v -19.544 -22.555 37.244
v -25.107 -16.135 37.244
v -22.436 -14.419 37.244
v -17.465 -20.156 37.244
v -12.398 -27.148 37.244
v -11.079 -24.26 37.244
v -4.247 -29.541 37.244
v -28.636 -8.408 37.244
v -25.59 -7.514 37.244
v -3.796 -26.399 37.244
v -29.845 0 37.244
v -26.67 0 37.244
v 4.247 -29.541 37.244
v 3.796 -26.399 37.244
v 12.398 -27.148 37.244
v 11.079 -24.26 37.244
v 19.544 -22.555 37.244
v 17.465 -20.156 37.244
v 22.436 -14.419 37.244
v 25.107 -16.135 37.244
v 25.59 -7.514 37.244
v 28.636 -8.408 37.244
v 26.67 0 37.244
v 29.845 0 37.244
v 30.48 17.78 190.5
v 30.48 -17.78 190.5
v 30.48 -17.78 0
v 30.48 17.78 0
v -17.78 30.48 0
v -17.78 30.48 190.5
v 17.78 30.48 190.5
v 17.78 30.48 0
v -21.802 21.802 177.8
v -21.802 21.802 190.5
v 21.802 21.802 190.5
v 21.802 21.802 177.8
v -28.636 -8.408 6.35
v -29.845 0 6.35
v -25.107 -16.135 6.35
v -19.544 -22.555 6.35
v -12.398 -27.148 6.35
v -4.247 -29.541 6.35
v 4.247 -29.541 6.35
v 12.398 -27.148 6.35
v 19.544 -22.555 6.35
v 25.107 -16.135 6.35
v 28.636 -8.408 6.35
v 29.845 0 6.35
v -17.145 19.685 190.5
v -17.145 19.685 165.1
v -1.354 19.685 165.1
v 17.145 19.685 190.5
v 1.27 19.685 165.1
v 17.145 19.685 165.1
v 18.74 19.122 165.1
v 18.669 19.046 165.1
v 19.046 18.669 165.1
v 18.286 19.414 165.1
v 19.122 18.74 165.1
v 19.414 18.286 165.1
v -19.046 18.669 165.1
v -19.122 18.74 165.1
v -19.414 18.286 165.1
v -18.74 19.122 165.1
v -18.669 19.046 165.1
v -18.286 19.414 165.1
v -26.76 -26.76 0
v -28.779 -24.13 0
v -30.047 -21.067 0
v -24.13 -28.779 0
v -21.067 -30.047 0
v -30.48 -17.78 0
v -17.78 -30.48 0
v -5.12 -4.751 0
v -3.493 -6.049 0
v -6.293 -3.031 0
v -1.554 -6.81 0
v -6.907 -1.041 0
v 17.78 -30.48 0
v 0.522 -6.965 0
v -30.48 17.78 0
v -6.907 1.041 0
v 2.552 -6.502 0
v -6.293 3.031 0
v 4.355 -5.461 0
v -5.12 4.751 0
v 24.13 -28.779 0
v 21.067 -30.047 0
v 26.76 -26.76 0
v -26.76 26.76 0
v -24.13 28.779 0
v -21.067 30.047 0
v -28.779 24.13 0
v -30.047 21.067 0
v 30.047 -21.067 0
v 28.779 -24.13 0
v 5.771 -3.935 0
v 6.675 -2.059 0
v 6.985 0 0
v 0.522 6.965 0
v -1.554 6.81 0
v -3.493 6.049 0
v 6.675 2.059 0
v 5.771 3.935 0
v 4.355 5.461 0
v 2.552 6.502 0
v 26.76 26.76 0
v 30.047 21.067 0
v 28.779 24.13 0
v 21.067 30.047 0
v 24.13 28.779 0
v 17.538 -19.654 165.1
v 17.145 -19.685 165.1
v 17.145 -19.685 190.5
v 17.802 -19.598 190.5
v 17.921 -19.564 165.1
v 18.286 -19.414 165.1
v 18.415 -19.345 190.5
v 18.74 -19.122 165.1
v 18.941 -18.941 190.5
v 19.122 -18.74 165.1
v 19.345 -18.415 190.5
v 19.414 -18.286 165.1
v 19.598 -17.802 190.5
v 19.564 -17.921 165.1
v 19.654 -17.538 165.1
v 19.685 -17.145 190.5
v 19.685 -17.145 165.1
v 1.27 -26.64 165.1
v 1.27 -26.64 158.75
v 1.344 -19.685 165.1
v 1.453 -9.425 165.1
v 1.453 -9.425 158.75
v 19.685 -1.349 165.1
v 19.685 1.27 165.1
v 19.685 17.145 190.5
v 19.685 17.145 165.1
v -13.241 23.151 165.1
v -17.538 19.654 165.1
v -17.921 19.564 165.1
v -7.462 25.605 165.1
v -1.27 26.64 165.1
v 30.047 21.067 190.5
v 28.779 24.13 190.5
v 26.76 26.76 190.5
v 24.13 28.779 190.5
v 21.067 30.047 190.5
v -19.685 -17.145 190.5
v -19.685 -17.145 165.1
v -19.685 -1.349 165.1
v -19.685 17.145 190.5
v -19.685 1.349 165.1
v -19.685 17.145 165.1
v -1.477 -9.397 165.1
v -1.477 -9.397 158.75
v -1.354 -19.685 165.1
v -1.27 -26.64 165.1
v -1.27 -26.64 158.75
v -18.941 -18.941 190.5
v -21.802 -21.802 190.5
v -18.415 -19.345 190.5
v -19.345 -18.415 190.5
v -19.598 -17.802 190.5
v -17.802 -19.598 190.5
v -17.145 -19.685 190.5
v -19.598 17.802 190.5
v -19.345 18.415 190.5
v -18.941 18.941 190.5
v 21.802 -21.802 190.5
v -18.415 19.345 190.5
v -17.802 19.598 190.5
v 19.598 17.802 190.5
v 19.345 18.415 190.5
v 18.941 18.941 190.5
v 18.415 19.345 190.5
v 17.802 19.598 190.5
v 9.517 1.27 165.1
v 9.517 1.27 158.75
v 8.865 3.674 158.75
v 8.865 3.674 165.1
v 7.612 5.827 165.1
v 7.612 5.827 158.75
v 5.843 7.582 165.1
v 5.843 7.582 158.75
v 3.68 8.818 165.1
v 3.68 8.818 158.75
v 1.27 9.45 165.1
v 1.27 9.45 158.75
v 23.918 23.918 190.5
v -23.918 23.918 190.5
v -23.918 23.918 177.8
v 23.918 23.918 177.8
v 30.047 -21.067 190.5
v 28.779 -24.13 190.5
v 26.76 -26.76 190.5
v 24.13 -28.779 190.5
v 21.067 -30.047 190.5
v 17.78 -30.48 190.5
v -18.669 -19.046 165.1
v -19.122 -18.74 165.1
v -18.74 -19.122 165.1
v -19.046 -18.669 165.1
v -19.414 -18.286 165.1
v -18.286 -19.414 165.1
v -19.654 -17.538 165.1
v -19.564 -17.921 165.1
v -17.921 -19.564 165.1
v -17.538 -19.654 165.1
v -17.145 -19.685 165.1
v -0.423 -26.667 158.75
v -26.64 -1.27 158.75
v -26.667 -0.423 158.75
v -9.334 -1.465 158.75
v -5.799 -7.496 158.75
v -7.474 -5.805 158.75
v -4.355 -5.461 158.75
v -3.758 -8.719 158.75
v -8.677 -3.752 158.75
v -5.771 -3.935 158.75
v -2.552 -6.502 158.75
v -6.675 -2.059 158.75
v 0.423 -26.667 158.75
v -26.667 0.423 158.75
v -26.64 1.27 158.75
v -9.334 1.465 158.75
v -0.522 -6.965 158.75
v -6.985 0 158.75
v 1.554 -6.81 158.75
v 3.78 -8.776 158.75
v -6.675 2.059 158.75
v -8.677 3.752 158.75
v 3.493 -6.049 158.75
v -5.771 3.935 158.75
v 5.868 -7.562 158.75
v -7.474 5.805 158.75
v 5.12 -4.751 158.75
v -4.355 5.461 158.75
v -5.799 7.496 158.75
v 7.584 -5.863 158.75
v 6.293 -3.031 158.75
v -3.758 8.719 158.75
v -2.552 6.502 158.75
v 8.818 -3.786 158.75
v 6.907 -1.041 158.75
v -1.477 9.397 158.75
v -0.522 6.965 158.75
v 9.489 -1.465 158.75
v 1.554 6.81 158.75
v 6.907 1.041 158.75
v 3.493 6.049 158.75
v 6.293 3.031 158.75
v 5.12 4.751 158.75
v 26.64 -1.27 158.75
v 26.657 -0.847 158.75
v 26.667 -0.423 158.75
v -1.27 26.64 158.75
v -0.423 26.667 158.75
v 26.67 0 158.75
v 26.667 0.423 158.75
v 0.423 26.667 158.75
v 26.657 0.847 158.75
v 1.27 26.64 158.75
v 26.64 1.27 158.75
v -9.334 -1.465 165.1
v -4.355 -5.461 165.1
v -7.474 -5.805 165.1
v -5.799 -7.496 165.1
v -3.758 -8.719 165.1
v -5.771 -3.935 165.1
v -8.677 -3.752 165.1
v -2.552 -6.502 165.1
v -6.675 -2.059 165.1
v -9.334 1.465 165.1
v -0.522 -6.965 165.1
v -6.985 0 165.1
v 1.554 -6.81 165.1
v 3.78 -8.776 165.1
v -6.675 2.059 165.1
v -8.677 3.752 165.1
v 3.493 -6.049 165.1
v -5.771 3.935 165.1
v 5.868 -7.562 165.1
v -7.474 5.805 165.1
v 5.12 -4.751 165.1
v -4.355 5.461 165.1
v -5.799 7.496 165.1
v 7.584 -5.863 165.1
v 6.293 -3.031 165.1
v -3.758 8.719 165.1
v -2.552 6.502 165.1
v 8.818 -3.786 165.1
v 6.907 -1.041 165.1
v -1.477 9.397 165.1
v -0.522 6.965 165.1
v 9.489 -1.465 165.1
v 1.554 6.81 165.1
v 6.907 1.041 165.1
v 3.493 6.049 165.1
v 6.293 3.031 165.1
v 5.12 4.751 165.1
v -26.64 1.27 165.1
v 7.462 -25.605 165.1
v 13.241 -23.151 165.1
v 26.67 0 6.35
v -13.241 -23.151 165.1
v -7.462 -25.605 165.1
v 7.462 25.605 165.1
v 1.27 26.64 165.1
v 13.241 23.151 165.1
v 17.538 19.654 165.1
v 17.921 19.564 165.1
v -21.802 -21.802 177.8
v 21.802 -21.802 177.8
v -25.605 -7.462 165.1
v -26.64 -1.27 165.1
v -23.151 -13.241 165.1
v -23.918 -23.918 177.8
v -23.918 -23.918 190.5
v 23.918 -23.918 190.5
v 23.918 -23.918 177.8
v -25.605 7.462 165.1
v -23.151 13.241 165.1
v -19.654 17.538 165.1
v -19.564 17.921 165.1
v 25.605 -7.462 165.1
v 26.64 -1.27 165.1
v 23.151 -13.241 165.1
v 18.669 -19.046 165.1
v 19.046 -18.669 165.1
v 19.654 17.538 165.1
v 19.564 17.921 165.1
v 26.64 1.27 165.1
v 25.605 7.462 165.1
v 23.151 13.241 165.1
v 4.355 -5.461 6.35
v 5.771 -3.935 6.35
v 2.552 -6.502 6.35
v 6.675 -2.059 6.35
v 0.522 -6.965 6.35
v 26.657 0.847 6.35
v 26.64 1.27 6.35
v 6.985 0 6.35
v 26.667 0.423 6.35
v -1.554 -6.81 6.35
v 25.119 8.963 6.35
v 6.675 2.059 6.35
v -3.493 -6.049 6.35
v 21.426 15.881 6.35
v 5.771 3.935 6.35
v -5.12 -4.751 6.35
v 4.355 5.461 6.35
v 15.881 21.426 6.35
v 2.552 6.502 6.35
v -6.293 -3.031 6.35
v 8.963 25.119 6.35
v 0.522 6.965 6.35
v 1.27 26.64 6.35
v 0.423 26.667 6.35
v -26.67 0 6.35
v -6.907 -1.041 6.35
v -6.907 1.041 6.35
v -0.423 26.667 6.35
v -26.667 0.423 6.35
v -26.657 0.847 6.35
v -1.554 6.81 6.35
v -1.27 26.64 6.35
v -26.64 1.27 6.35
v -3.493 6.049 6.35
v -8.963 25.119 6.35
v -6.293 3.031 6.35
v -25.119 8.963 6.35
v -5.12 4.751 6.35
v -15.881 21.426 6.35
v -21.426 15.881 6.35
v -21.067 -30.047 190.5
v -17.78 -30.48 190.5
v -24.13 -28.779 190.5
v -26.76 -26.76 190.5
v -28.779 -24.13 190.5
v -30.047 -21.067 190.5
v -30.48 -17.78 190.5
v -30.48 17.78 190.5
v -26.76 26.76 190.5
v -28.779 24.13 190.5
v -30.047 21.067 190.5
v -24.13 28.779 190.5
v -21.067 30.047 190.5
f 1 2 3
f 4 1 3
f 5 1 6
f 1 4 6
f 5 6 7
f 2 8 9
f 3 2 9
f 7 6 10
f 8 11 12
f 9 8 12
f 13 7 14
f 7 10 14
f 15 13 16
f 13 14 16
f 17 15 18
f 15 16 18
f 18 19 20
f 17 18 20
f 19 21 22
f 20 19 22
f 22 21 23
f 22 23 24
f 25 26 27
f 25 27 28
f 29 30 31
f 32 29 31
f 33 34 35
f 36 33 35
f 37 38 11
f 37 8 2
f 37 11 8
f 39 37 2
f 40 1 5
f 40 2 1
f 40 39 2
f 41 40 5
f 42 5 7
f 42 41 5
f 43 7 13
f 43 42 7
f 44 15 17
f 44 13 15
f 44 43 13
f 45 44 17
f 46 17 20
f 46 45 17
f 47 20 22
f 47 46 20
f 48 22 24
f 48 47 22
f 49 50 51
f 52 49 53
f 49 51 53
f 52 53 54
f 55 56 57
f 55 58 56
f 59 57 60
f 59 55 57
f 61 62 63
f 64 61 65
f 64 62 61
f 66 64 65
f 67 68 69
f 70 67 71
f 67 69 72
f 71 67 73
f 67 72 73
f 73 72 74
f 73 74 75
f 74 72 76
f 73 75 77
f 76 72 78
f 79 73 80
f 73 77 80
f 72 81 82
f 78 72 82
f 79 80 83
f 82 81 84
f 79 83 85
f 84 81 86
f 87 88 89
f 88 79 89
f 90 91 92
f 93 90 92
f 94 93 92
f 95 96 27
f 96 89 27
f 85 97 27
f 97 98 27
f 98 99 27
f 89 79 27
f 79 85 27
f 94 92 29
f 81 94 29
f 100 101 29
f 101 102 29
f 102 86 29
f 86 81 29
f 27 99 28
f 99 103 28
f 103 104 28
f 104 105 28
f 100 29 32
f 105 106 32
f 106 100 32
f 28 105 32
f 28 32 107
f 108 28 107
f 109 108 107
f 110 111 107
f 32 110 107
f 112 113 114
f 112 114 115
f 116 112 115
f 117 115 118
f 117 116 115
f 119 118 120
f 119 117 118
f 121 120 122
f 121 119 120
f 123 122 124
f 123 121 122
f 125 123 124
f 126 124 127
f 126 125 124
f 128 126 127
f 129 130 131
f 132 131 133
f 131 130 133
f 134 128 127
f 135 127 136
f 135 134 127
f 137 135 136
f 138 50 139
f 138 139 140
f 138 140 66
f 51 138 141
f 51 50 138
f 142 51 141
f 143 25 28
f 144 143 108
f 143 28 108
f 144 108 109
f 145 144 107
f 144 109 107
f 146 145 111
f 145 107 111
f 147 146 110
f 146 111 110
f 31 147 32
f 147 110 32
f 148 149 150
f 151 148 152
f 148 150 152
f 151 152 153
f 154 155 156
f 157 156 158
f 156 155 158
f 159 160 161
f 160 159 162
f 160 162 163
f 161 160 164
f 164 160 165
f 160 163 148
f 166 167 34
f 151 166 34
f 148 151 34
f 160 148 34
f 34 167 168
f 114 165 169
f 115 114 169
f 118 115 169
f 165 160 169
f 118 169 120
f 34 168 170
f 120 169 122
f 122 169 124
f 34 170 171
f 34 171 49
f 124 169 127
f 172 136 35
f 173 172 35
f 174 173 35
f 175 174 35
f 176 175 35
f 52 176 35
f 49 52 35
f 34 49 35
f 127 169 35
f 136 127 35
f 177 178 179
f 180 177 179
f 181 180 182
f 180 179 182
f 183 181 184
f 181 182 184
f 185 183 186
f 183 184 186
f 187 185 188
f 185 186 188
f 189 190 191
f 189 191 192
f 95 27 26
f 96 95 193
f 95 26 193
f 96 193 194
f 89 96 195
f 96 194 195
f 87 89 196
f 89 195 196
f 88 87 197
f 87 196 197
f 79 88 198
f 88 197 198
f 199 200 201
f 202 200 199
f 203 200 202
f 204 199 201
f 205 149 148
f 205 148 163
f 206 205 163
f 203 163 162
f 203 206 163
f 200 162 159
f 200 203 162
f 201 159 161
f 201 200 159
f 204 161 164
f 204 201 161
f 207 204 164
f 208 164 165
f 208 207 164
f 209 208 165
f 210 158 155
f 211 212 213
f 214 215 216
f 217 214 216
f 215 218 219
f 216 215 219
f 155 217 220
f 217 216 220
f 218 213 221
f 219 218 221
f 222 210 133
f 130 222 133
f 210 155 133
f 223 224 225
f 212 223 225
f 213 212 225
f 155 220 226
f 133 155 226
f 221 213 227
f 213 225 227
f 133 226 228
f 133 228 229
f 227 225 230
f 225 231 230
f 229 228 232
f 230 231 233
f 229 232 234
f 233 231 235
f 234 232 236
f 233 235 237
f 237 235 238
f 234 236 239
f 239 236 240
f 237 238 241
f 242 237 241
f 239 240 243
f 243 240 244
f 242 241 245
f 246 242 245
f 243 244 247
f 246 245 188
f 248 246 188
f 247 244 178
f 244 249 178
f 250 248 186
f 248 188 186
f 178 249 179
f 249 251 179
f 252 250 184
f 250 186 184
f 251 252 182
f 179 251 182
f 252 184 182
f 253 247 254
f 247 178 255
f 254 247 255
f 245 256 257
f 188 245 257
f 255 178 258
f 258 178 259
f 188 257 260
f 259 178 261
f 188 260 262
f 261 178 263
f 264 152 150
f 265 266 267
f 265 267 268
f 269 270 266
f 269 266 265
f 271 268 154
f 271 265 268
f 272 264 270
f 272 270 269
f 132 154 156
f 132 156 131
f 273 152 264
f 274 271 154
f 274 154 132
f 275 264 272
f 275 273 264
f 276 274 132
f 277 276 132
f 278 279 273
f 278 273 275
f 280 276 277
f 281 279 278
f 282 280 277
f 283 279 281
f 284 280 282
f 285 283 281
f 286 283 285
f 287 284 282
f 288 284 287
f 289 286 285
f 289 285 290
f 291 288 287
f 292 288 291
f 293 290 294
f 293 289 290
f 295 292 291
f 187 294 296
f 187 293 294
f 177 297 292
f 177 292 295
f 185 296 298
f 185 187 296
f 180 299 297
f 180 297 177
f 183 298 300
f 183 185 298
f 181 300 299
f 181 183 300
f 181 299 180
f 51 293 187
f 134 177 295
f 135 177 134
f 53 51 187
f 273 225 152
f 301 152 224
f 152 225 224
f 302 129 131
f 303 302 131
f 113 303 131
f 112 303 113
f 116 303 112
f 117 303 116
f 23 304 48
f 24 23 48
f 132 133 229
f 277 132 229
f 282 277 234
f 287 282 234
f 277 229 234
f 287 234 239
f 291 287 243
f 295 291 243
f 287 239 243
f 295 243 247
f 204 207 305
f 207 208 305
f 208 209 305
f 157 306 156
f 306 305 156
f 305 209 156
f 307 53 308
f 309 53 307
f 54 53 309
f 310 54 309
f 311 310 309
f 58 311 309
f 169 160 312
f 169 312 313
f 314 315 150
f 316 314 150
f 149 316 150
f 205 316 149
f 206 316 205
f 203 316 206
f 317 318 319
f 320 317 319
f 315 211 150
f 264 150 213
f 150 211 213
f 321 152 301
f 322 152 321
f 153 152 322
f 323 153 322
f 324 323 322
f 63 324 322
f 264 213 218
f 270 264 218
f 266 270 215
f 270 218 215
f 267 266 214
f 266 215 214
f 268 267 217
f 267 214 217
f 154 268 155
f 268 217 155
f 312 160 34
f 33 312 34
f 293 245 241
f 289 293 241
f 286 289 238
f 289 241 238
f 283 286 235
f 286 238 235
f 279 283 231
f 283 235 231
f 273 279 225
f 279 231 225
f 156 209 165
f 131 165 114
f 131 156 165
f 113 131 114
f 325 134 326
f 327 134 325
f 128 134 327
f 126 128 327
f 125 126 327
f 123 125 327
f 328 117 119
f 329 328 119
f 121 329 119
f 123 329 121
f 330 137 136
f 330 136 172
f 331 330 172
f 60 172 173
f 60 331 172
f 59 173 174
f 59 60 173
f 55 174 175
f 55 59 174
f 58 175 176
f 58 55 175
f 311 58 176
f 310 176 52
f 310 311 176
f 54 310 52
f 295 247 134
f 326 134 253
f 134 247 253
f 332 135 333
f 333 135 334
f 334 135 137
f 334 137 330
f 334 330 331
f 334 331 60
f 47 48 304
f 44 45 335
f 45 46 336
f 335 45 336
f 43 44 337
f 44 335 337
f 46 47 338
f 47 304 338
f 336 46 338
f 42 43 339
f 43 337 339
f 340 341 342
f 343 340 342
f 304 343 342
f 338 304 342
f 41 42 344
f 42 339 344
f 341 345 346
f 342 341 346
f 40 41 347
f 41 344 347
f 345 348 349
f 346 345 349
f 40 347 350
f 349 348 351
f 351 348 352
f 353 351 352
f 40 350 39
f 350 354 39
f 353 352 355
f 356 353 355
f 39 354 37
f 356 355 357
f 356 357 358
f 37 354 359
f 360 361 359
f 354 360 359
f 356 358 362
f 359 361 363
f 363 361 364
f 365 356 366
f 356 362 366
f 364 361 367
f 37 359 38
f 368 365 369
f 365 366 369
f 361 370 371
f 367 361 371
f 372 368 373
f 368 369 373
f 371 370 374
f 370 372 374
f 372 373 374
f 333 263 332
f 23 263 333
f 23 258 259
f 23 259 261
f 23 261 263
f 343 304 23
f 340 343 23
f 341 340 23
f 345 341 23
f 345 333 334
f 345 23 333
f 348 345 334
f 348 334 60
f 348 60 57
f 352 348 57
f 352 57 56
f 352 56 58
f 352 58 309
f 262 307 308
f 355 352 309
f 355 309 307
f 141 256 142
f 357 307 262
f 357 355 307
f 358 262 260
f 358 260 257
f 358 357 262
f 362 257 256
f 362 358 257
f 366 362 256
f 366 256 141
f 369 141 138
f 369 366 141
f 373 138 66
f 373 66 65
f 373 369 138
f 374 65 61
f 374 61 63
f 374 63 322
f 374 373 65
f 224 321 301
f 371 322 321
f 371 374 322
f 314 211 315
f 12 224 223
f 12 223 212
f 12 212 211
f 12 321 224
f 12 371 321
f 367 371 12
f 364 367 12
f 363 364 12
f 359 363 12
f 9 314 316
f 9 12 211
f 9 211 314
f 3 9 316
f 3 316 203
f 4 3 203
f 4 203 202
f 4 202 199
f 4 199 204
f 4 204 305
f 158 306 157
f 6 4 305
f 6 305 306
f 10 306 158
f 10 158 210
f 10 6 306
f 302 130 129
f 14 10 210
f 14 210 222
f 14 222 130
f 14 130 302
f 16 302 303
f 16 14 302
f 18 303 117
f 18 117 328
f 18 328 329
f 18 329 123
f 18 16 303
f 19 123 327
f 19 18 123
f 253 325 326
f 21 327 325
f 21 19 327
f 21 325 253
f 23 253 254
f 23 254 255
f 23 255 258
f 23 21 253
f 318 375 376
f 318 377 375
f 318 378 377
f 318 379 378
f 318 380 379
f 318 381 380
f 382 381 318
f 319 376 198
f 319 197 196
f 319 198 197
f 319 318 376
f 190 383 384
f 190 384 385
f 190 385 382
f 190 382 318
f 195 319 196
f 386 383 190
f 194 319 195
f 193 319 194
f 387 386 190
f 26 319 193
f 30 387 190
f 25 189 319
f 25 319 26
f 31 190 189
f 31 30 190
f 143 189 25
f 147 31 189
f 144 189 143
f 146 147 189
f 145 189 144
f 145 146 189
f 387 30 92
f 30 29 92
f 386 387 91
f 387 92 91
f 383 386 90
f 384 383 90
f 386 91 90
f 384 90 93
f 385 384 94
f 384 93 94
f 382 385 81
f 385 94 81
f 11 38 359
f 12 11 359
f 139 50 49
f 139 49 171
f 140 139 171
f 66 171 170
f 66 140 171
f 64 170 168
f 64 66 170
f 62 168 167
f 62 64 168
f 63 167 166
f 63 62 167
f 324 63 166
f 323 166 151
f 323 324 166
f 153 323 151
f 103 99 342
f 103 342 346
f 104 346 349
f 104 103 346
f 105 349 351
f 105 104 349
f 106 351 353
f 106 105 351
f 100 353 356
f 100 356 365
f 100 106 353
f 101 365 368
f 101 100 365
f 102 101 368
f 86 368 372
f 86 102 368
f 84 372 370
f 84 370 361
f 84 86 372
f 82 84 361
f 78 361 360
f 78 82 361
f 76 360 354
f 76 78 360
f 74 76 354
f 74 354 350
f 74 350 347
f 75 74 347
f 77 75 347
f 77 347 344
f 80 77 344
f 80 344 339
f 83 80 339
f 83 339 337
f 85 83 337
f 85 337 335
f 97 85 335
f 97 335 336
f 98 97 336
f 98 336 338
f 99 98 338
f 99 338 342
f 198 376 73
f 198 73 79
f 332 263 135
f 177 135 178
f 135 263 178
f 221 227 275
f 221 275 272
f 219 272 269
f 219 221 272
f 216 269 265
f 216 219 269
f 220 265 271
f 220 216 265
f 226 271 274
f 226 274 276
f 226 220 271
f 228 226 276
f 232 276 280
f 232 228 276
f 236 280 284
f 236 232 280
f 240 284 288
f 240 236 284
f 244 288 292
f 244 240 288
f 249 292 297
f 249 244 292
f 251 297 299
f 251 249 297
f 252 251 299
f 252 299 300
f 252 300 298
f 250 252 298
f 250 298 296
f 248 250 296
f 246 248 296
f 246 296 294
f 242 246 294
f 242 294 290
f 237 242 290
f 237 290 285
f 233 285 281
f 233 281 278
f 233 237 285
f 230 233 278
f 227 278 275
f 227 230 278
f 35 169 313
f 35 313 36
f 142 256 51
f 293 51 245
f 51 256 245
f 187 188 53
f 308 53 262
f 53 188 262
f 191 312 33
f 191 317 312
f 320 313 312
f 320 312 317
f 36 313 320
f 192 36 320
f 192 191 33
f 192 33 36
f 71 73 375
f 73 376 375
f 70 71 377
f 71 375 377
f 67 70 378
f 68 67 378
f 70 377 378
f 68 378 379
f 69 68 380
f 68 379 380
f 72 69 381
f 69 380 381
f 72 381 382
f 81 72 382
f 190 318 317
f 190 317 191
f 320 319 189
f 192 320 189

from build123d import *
from build123d.topology import SkipClean

# Parameters (mm, degrees)
SKETCH1_R           = 29.845
SKETCH1_R_2         = 26.67
BOSS_EXTRUDE1_DEPTH = 165.1
SKETCH2_W           = 59.69
SKETCH2_H           = 38.1
CUT_EXTRUDE1_DEPTH  = 171.409677102
BOSS_EXTRUDE2_DEPTH = 6.35
SKETCH5_R           = 29.845
SKETCH5_R_2         = 6.985
BOSS_EXTRUDE4_DEPTH = 6.35
BOSS_EXTRUDE5_START = -6.35
SKETCH4_R           = 29.845
SKETCH4_R_2         = 26.67
SKETCH4_R_3         = 6.985
BOSS_EXTRUDE5_DEPTH = 6.35
SKETCH6_W           = 60.96
SKETCH6_H           = 60.96
SKETCH6_R           = 29.845
BOSS_EXTRUDE7_DEPTH = 190.5
BOSS_EXTRUDE8_START = -25.4
SKETCH7_W           = 60.96
SKETCH7_H           = 60.96
SKETCH7_R           = 29.845
SKETCH7_W_2         = 39.37
SKETCH7_H_2         = 39.37
BOSS_EXTRUDE8_DEPTH = 25.4
SKETCH8_W           = 47.836836
SKETCH8_H           = 47.836836
SKETCH8_W_2         = 43.603672
SKETCH8_H_2         = 43.603672
CUT_EXTRUDE2_DEPTH  = 12.7
FILLET1_R           = 2.54
FILLET2_R           = 12.7


with BuildPart() as part:
    # Sketch1 → Boss-Extrude1 (new body)
    with BuildSketch(Plane.XY):
        Circle(SKETCH1_R)
        Circle(SKETCH1_R_2, mode=Mode.SUBTRACT)
    extrude(amount=BOSS_EXTRUDE1_DEPTH)

    # Sketch2 → Cut-Extrude1 (cut, through all)
    with BuildSketch(Plane(origin=(0, 0, 0), x_dir=(1, 0, 0), z_dir=(0, 1, 0))):
        with Locations((0, -18.194460122)):
            Rectangle(SKETCH2_W, SKETCH2_H)
    extrude(amount=-CUT_EXTRUDE1_DEPTH, mode=Mode.SUBTRACT)

    # Sketch3 → Boss-Extrude2 (add)
    with BuildSketch(Plane(origin=(0, 0, 0), x_dir=(-1, 0, 0), z_dir=(0, 0, -1))):
        with BuildLine():
            Line((-29.845, 0), (-6.985, 0))
            ThreePointArc((-6.985, 0), (0, 6.985), (6.985, 0))
            Line((6.985, 0), (29.845, 0))
            ThreePointArc((29.845, 0), (0, 29.845), (-29.845, 0))
        make_face()
    extrude(amount=-BOSS_EXTRUDE2_DEPTH)

    # Sketch5 → Boss-Extrude4 (add)
    with SkipClean():  # the faces are left unmerged after this step: merging them gives an invalid solid
        with BuildSketch(Plane(origin=(0, 0, 0), x_dir=(-1, 0, 0), z_dir=(0, 0, -1))):
            with Locations(Location((0, 0, 0), (0, 0, 180))):
                Circle(SKETCH5_R)
            with BuildLine():
                Line((26.639744744, 1.27), (9.33422749, 1.465384615))
                ThreePointArc((9.33422749, 1.465384615), (6.689709997, 6.703146826), (1.477288556, 9.397267918))
                Line((1.477288556, 9.397267918), (1.27, 26.639744744))
                ThreePointArc((1.27, 26.639744744), (18.858537854, 18.858537854), (26.639744744, 1.27))
            make_face(mode=Mode.SUBTRACT)
            with BuildLine():
                Line((-1.27, 26.639744744), (-1.27, 9.45004085))
                ThreePointArc((-1.27, 9.45004085), (-6.784923303, 6.762723487), (-9.517329266, 1.27))
                Line((-9.517329266, 1.27), (-26.639744744, 1.27))
                ThreePointArc((-26.639744744, 1.27), (-18.858537854, 18.858537854), (-1.27, 26.639744744))
            make_face(mode=Mode.SUBTRACT)
            Circle(SKETCH5_R_2, mode=Mode.SUBTRACT)
        extrude(amount=-BOSS_EXTRUDE4_DEPTH)

    # Sketch4 → Boss-Extrude5 (add)
    # profile 1 of 2: a face of its own
    with SkipClean():  # the faces are left unmerged after this step: merging them gives an invalid solid
        with BuildSketch(Plane.XY.offset(165.1).offset(BOSS_EXTRUDE5_START)):
            Circle(SKETCH4_R)
            with Locations(Location((0, 0, 0), (0, 0, 180))):
                Circle(SKETCH4_R_2, mode=Mode.SUBTRACT)
        # profile 2 of 2: a face of its own
        with BuildSketch(Plane.XY.offset(165.1).offset(BOSS_EXTRUDE5_START)):
            with BuildLine():
                Line((1.27, 9.45004085), (1.27, 26.639744744))
                ThreePointArc((1.27, 26.639744744), (0, 26.67), (-1.27, 26.639744744))
                Line((-1.27, 26.639744744), (-1.477288556, 9.397267918))
                ThreePointArc((-1.477288556, 9.397267918), (-6.689709997, 6.703146826), (-9.33422749, 1.465384615))
                Line((-9.33422749, 1.465384615), (-26.639744744, 1.27))
                ThreePointArc((-26.639744744, 1.27), (-26.67, 0), (-26.639744744, -1.27))
                Line((-26.639744744, -1.27), (-9.33422749, -1.465384615))
                ThreePointArc((-9.33422749, -1.465384615), (-6.689709997, -6.703146826), (-1.477288556, -9.397267918))
                Line((-1.477288556, -9.397267918), (-1.27, -26.639744744))
                ThreePointArc((-1.27, -26.639744744), (0, -26.67), (1.27, -26.639744744))
                Line((1.27, -26.639744744), (1.453480675, -9.425070814))
                ThreePointArc((1.453480675, -9.425070814), (6.780569847, -6.767038646), (9.488978712, -1.465384615))
                Line((9.488978712, -1.465384615), (26.639744744, -1.27))
                ThreePointArc((26.639744744, -1.27), (26.662435113, -0.635180167), (26.67, 0))
                ThreePointArc((26.67, 0), (26.662435113, 0.635180167), (26.639744744, 1.27))
                Line((26.639744744, 1.27), (9.517329266, 1.27))
                ThreePointArc((9.517329266, 1.27), (6.784923303, 6.762723487), (1.27, 9.45004085))
            make_face()
            with Locations(Location((0, 0, 0), (0, 0, 180))):
                Circle(SKETCH4_R_3, mode=Mode.SUBTRACT)
        extrude(amount=BOSS_EXTRUDE5_DEPTH)

    # Sketch6 → Boss-Extrude7 (add)
    with BuildSketch(Plane.XY):
        Rectangle(SKETCH6_W, SKETCH6_H)
        Circle(SKETCH6_R, mode=Mode.SUBTRACT)
    extrude(amount=BOSS_EXTRUDE7_DEPTH)

    # Sketch7 → Boss-Extrude8 (add)
    # profile 1 of 2: a face of its own
    with BuildSketch(Plane.XY.offset(190.5).offset(BOSS_EXTRUDE8_START)):
        Rectangle(SKETCH7_W, SKETCH7_H)
        Circle(SKETCH7_R, mode=Mode.SUBTRACT)
    # profile 2 of 2: a face of its own
    with BuildSketch(Plane.XY.offset(190.5).offset(BOSS_EXTRUDE8_START)):
        Circle(SKETCH7_R)
        Rectangle(SKETCH7_W_2, SKETCH7_H_2, mode=Mode.SUBTRACT)
    extrude(amount=BOSS_EXTRUDE8_DEPTH)

    # Sketch8 → Cut-Extrude2 (cut)
    with BuildSketch(Plane.XY.offset(190.5)):
        Rectangle(SKETCH8_W, SKETCH8_H)
        Rectangle(SKETCH8_W_2, SKETCH8_H_2, mode=Mode.SUBTRACT)
    extrude(amount=-CUT_EXTRUDE2_DEPTH, mode=Mode.SUBTRACT)

    # Fillet1
    # the kernel refuses this fillet: 2.54 mm, written as the material it adds along each edge
    with BuildSketch(Plane(origin=(19.685, -19.685, 165.1), x_dir=(-1, 0, 0), z_dir=(0, 0, 1)), Plane(origin=(19.685, 19.685, 165.1), x_dir=(0, -1, 0), z_dir=(0, 0, 1)), Plane(origin=(-19.685, -19.685, 165.1), x_dir=(0, 1, 0), z_dir=(0, 0, 1))) as fillet1_piece_1:
        with BuildLine():
            CenterArc((FILLET1_R, -FILLET1_R), FILLET1_R, 90, 90)
            Line((0, -FILLET1_R), (0, 0))
            Line((0, 0), (FILLET1_R, 0))
        make_face()
    extrude(amount=25.4)
    with BuildSketch(Plane(origin=(-19.685, 19.685, 165.1), x_dir=(0, -1, 0), z_dir=(0, 0, 1))) as fillet1_piece_2:
        with BuildLine():
            CenterArc((FILLET1_R, FILLET1_R), FILLET1_R, 180, 90)
            Line((0, FILLET1_R), (0, 0))
            Line((0, 0), (FILLET1_R, 0))
        make_face()
    extrude(amount=25.4)

    # Fillet2
    fillet2_edges = [part.edges().sort_by_distance(p)[0] for p in [
        (-30.48, 30.48, 95.25),
        (-30.48, -30.48, 95.25),
        (30.48, -30.48, 95.25),
        (30.48, 30.48, 95.25),
    ]]
    fillet(fillet2_edges, radius=FILLET2_R)


solid = part.part
